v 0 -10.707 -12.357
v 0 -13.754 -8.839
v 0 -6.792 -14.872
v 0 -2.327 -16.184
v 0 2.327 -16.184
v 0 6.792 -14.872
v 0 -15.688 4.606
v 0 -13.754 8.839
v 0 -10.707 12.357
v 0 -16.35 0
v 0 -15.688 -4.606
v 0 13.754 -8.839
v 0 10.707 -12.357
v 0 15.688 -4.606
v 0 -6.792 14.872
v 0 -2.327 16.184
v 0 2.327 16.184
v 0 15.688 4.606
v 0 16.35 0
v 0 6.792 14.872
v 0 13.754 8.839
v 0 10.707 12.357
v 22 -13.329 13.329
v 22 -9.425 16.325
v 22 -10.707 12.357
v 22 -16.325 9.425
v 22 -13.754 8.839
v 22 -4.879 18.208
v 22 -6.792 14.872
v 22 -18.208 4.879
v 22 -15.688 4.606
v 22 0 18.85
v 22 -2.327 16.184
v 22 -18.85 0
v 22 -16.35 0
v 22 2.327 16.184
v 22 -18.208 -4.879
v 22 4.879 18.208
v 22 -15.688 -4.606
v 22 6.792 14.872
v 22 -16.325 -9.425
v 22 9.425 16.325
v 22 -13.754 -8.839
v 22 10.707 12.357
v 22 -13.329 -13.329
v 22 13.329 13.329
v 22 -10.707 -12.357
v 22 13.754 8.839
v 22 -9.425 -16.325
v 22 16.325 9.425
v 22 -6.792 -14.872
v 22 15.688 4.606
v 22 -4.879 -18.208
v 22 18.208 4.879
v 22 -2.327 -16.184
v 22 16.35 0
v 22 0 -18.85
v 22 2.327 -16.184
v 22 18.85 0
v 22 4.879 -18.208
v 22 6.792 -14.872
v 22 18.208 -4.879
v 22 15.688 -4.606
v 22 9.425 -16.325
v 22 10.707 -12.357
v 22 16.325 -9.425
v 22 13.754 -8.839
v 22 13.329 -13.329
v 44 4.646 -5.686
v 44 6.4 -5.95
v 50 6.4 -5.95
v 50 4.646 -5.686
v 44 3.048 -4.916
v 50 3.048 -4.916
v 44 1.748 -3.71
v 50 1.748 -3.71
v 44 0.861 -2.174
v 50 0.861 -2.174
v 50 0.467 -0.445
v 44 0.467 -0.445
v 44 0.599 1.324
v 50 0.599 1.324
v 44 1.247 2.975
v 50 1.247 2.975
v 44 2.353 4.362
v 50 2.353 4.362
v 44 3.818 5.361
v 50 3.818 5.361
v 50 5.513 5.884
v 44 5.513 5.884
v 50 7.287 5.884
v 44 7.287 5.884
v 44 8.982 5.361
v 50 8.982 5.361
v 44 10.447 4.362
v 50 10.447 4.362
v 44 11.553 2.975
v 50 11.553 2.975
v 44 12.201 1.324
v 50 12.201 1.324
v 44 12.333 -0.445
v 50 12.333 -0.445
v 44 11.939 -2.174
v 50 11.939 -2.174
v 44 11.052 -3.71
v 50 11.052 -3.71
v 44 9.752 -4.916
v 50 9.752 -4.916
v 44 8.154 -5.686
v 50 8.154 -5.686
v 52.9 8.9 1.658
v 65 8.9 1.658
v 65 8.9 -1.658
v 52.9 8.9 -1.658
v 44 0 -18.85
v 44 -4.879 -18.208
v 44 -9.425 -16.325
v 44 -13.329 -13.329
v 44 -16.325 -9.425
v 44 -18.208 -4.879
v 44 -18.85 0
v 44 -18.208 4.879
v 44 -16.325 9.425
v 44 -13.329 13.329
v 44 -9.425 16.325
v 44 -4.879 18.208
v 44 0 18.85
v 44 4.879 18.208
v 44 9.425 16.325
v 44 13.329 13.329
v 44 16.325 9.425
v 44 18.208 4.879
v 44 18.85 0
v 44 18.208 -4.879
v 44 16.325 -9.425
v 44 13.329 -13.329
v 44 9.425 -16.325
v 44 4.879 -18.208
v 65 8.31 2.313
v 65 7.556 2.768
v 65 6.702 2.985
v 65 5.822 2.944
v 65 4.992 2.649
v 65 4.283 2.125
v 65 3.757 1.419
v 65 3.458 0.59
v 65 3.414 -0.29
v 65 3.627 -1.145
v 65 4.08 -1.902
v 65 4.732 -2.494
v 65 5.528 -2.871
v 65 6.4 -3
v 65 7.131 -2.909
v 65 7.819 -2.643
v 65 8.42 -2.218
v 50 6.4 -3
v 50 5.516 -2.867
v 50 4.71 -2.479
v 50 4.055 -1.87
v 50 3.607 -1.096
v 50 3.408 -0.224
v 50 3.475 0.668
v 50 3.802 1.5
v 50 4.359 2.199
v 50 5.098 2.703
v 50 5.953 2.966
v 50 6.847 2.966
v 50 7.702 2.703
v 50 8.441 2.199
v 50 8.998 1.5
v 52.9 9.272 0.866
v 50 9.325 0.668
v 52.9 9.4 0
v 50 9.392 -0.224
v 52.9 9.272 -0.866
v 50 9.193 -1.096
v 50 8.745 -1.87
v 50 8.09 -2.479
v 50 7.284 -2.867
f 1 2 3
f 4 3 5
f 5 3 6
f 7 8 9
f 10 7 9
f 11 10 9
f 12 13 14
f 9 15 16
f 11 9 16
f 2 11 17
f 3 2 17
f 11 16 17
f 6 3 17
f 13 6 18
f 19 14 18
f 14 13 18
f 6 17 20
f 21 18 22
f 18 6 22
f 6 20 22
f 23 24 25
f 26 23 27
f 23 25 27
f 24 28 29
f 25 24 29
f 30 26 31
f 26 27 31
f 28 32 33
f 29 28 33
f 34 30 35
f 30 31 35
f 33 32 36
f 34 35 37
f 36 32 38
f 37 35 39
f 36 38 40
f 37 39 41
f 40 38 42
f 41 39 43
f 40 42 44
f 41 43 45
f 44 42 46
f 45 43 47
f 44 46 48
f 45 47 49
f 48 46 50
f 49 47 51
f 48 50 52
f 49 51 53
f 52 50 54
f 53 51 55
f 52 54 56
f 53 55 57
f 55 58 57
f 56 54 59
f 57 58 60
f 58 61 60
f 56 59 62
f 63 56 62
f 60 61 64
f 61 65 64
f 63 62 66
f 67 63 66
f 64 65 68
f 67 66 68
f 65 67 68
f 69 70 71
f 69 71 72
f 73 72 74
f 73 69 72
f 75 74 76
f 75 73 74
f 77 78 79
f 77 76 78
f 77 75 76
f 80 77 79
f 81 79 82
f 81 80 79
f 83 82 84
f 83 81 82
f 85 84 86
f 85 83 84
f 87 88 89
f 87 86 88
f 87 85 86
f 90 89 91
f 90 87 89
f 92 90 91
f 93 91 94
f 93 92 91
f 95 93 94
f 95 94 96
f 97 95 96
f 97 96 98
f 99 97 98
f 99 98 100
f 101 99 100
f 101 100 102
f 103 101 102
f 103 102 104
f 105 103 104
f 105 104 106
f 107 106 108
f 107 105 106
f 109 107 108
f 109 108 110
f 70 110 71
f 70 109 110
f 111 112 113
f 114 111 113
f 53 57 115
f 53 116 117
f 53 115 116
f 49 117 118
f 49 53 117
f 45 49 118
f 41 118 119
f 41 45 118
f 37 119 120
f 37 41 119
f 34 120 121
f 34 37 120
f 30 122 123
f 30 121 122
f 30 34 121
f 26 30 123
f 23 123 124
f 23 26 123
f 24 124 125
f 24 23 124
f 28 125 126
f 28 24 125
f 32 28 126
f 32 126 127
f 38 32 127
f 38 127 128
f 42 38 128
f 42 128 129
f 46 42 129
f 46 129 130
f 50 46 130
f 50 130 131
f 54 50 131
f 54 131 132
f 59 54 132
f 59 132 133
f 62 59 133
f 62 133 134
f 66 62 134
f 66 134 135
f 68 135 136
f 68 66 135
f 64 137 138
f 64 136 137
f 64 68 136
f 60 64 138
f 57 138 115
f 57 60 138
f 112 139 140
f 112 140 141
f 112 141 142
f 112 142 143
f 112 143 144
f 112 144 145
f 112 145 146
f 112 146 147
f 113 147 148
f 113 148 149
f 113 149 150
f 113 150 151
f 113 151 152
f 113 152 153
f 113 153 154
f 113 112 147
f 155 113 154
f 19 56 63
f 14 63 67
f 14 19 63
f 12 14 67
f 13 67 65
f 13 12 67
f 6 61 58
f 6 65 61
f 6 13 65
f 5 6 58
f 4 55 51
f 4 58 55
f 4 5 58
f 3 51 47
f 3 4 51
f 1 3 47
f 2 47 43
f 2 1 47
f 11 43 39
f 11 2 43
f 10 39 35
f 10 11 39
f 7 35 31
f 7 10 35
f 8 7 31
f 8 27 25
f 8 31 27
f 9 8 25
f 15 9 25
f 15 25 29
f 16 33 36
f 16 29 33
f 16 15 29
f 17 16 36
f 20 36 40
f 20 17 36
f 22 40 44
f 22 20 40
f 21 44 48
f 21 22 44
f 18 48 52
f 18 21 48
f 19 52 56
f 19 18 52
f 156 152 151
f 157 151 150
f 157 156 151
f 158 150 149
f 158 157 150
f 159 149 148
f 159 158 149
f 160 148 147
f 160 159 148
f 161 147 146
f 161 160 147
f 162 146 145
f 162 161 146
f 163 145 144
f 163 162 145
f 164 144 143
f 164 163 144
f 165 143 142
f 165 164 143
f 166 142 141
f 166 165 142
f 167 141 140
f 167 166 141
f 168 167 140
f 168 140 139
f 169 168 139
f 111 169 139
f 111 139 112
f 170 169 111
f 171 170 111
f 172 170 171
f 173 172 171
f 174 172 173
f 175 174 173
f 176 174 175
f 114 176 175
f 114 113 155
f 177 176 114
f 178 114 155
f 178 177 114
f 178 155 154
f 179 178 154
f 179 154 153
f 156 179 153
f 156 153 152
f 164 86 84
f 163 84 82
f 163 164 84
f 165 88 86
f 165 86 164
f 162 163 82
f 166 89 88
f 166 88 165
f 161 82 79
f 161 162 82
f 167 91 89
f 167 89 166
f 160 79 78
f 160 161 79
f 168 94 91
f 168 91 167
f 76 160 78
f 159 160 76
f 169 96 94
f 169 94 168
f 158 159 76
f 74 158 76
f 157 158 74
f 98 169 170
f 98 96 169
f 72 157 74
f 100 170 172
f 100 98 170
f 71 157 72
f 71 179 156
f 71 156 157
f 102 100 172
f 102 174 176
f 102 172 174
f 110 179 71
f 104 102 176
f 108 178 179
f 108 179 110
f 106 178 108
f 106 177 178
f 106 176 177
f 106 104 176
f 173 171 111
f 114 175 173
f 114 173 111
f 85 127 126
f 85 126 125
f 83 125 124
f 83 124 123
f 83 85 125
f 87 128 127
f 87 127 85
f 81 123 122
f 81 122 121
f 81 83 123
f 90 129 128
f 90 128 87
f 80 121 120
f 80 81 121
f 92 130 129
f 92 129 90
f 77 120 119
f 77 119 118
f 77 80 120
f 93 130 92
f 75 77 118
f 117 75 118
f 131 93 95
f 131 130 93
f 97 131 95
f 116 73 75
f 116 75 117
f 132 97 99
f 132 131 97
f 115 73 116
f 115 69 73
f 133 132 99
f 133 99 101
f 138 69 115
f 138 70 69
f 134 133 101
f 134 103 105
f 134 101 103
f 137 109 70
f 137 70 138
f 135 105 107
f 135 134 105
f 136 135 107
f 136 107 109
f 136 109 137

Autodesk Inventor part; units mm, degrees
ref_plane "YZ Plane" through (0, 0, 0) normal (1, 0, 0) x (0, 1, 0)
ref_plane "XZ Plane" through (0, 0, 0) normal (0, 1, 0) x (-1, 0, 0)
ref_plane "XY Plane" through (0, 0, 0) normal (0, 0, 1) x (1, 0, 0)
sketch "Sketch1" plane through (0, 0, 0) normal (1, 0, 0) x (0, 1, 0)
  circle A0 centre (0, 0) radius 16.35
  dimension "d0" = 32.7
extrude "Extrusion1" add sketch "Sketch1" along normal blind 22
sketch "Sketch2" plane through (22, 0, 0) normal (1, 0, 0) x (0, 0, -1)
  circle A0 centre (0, 0) radius 18.85
  dimension "d3" = 37.7
extrude "Extrusion2" add sketch "Sketch2" along normal blind 22
sketch "Sketch3" plane through (44, 0, 0) normal (1, 0, 0) x (0, 0, -1)
  circle A0 centre (0, 6.4) radius 5.95
  circle A1 centre (0, 0) radius 18.85 projected
  line L0 (0, 18.85) -> (0, 12.35) construction
  dimension "d8" = 11.9
  dimension "d7" = 6.5
extrude "Extrusion3" add sketch "Sketch3" along normal blind 6 contours A0
sketch "Sketch4" plane through (50, 6.4, 0) normal (1, 0, 0) x (0, 0, -1)
  circle A0 centre (0, 0) radius 5.95 projected
  circle A1 centre (0, 0) radius 3
  point P0 (0, -6.4)
  dimension "d14" = 6
extrude "Extrusion4" add sketch "Sketch4" along normal blind 15 contours A1
sketch "Sketch5" plane through (65, 6.4, 0) normal (1, 0, 0) x (0, 0, -1)
  circle A0 centre (0, 0) radius 3 projected
  line L0 (-1.6583, 2.5) -> (1.6583, 2.5)
  point P0 (0, 2.5)
  dimension "d17" = 2.5
extrude "Extrusion5" cut sketch "Sketch5" against normal blind 12.1 contours L0 A0 picked at (-0.1169, 2.6598)
properties part number "Drive Motor approximate"
